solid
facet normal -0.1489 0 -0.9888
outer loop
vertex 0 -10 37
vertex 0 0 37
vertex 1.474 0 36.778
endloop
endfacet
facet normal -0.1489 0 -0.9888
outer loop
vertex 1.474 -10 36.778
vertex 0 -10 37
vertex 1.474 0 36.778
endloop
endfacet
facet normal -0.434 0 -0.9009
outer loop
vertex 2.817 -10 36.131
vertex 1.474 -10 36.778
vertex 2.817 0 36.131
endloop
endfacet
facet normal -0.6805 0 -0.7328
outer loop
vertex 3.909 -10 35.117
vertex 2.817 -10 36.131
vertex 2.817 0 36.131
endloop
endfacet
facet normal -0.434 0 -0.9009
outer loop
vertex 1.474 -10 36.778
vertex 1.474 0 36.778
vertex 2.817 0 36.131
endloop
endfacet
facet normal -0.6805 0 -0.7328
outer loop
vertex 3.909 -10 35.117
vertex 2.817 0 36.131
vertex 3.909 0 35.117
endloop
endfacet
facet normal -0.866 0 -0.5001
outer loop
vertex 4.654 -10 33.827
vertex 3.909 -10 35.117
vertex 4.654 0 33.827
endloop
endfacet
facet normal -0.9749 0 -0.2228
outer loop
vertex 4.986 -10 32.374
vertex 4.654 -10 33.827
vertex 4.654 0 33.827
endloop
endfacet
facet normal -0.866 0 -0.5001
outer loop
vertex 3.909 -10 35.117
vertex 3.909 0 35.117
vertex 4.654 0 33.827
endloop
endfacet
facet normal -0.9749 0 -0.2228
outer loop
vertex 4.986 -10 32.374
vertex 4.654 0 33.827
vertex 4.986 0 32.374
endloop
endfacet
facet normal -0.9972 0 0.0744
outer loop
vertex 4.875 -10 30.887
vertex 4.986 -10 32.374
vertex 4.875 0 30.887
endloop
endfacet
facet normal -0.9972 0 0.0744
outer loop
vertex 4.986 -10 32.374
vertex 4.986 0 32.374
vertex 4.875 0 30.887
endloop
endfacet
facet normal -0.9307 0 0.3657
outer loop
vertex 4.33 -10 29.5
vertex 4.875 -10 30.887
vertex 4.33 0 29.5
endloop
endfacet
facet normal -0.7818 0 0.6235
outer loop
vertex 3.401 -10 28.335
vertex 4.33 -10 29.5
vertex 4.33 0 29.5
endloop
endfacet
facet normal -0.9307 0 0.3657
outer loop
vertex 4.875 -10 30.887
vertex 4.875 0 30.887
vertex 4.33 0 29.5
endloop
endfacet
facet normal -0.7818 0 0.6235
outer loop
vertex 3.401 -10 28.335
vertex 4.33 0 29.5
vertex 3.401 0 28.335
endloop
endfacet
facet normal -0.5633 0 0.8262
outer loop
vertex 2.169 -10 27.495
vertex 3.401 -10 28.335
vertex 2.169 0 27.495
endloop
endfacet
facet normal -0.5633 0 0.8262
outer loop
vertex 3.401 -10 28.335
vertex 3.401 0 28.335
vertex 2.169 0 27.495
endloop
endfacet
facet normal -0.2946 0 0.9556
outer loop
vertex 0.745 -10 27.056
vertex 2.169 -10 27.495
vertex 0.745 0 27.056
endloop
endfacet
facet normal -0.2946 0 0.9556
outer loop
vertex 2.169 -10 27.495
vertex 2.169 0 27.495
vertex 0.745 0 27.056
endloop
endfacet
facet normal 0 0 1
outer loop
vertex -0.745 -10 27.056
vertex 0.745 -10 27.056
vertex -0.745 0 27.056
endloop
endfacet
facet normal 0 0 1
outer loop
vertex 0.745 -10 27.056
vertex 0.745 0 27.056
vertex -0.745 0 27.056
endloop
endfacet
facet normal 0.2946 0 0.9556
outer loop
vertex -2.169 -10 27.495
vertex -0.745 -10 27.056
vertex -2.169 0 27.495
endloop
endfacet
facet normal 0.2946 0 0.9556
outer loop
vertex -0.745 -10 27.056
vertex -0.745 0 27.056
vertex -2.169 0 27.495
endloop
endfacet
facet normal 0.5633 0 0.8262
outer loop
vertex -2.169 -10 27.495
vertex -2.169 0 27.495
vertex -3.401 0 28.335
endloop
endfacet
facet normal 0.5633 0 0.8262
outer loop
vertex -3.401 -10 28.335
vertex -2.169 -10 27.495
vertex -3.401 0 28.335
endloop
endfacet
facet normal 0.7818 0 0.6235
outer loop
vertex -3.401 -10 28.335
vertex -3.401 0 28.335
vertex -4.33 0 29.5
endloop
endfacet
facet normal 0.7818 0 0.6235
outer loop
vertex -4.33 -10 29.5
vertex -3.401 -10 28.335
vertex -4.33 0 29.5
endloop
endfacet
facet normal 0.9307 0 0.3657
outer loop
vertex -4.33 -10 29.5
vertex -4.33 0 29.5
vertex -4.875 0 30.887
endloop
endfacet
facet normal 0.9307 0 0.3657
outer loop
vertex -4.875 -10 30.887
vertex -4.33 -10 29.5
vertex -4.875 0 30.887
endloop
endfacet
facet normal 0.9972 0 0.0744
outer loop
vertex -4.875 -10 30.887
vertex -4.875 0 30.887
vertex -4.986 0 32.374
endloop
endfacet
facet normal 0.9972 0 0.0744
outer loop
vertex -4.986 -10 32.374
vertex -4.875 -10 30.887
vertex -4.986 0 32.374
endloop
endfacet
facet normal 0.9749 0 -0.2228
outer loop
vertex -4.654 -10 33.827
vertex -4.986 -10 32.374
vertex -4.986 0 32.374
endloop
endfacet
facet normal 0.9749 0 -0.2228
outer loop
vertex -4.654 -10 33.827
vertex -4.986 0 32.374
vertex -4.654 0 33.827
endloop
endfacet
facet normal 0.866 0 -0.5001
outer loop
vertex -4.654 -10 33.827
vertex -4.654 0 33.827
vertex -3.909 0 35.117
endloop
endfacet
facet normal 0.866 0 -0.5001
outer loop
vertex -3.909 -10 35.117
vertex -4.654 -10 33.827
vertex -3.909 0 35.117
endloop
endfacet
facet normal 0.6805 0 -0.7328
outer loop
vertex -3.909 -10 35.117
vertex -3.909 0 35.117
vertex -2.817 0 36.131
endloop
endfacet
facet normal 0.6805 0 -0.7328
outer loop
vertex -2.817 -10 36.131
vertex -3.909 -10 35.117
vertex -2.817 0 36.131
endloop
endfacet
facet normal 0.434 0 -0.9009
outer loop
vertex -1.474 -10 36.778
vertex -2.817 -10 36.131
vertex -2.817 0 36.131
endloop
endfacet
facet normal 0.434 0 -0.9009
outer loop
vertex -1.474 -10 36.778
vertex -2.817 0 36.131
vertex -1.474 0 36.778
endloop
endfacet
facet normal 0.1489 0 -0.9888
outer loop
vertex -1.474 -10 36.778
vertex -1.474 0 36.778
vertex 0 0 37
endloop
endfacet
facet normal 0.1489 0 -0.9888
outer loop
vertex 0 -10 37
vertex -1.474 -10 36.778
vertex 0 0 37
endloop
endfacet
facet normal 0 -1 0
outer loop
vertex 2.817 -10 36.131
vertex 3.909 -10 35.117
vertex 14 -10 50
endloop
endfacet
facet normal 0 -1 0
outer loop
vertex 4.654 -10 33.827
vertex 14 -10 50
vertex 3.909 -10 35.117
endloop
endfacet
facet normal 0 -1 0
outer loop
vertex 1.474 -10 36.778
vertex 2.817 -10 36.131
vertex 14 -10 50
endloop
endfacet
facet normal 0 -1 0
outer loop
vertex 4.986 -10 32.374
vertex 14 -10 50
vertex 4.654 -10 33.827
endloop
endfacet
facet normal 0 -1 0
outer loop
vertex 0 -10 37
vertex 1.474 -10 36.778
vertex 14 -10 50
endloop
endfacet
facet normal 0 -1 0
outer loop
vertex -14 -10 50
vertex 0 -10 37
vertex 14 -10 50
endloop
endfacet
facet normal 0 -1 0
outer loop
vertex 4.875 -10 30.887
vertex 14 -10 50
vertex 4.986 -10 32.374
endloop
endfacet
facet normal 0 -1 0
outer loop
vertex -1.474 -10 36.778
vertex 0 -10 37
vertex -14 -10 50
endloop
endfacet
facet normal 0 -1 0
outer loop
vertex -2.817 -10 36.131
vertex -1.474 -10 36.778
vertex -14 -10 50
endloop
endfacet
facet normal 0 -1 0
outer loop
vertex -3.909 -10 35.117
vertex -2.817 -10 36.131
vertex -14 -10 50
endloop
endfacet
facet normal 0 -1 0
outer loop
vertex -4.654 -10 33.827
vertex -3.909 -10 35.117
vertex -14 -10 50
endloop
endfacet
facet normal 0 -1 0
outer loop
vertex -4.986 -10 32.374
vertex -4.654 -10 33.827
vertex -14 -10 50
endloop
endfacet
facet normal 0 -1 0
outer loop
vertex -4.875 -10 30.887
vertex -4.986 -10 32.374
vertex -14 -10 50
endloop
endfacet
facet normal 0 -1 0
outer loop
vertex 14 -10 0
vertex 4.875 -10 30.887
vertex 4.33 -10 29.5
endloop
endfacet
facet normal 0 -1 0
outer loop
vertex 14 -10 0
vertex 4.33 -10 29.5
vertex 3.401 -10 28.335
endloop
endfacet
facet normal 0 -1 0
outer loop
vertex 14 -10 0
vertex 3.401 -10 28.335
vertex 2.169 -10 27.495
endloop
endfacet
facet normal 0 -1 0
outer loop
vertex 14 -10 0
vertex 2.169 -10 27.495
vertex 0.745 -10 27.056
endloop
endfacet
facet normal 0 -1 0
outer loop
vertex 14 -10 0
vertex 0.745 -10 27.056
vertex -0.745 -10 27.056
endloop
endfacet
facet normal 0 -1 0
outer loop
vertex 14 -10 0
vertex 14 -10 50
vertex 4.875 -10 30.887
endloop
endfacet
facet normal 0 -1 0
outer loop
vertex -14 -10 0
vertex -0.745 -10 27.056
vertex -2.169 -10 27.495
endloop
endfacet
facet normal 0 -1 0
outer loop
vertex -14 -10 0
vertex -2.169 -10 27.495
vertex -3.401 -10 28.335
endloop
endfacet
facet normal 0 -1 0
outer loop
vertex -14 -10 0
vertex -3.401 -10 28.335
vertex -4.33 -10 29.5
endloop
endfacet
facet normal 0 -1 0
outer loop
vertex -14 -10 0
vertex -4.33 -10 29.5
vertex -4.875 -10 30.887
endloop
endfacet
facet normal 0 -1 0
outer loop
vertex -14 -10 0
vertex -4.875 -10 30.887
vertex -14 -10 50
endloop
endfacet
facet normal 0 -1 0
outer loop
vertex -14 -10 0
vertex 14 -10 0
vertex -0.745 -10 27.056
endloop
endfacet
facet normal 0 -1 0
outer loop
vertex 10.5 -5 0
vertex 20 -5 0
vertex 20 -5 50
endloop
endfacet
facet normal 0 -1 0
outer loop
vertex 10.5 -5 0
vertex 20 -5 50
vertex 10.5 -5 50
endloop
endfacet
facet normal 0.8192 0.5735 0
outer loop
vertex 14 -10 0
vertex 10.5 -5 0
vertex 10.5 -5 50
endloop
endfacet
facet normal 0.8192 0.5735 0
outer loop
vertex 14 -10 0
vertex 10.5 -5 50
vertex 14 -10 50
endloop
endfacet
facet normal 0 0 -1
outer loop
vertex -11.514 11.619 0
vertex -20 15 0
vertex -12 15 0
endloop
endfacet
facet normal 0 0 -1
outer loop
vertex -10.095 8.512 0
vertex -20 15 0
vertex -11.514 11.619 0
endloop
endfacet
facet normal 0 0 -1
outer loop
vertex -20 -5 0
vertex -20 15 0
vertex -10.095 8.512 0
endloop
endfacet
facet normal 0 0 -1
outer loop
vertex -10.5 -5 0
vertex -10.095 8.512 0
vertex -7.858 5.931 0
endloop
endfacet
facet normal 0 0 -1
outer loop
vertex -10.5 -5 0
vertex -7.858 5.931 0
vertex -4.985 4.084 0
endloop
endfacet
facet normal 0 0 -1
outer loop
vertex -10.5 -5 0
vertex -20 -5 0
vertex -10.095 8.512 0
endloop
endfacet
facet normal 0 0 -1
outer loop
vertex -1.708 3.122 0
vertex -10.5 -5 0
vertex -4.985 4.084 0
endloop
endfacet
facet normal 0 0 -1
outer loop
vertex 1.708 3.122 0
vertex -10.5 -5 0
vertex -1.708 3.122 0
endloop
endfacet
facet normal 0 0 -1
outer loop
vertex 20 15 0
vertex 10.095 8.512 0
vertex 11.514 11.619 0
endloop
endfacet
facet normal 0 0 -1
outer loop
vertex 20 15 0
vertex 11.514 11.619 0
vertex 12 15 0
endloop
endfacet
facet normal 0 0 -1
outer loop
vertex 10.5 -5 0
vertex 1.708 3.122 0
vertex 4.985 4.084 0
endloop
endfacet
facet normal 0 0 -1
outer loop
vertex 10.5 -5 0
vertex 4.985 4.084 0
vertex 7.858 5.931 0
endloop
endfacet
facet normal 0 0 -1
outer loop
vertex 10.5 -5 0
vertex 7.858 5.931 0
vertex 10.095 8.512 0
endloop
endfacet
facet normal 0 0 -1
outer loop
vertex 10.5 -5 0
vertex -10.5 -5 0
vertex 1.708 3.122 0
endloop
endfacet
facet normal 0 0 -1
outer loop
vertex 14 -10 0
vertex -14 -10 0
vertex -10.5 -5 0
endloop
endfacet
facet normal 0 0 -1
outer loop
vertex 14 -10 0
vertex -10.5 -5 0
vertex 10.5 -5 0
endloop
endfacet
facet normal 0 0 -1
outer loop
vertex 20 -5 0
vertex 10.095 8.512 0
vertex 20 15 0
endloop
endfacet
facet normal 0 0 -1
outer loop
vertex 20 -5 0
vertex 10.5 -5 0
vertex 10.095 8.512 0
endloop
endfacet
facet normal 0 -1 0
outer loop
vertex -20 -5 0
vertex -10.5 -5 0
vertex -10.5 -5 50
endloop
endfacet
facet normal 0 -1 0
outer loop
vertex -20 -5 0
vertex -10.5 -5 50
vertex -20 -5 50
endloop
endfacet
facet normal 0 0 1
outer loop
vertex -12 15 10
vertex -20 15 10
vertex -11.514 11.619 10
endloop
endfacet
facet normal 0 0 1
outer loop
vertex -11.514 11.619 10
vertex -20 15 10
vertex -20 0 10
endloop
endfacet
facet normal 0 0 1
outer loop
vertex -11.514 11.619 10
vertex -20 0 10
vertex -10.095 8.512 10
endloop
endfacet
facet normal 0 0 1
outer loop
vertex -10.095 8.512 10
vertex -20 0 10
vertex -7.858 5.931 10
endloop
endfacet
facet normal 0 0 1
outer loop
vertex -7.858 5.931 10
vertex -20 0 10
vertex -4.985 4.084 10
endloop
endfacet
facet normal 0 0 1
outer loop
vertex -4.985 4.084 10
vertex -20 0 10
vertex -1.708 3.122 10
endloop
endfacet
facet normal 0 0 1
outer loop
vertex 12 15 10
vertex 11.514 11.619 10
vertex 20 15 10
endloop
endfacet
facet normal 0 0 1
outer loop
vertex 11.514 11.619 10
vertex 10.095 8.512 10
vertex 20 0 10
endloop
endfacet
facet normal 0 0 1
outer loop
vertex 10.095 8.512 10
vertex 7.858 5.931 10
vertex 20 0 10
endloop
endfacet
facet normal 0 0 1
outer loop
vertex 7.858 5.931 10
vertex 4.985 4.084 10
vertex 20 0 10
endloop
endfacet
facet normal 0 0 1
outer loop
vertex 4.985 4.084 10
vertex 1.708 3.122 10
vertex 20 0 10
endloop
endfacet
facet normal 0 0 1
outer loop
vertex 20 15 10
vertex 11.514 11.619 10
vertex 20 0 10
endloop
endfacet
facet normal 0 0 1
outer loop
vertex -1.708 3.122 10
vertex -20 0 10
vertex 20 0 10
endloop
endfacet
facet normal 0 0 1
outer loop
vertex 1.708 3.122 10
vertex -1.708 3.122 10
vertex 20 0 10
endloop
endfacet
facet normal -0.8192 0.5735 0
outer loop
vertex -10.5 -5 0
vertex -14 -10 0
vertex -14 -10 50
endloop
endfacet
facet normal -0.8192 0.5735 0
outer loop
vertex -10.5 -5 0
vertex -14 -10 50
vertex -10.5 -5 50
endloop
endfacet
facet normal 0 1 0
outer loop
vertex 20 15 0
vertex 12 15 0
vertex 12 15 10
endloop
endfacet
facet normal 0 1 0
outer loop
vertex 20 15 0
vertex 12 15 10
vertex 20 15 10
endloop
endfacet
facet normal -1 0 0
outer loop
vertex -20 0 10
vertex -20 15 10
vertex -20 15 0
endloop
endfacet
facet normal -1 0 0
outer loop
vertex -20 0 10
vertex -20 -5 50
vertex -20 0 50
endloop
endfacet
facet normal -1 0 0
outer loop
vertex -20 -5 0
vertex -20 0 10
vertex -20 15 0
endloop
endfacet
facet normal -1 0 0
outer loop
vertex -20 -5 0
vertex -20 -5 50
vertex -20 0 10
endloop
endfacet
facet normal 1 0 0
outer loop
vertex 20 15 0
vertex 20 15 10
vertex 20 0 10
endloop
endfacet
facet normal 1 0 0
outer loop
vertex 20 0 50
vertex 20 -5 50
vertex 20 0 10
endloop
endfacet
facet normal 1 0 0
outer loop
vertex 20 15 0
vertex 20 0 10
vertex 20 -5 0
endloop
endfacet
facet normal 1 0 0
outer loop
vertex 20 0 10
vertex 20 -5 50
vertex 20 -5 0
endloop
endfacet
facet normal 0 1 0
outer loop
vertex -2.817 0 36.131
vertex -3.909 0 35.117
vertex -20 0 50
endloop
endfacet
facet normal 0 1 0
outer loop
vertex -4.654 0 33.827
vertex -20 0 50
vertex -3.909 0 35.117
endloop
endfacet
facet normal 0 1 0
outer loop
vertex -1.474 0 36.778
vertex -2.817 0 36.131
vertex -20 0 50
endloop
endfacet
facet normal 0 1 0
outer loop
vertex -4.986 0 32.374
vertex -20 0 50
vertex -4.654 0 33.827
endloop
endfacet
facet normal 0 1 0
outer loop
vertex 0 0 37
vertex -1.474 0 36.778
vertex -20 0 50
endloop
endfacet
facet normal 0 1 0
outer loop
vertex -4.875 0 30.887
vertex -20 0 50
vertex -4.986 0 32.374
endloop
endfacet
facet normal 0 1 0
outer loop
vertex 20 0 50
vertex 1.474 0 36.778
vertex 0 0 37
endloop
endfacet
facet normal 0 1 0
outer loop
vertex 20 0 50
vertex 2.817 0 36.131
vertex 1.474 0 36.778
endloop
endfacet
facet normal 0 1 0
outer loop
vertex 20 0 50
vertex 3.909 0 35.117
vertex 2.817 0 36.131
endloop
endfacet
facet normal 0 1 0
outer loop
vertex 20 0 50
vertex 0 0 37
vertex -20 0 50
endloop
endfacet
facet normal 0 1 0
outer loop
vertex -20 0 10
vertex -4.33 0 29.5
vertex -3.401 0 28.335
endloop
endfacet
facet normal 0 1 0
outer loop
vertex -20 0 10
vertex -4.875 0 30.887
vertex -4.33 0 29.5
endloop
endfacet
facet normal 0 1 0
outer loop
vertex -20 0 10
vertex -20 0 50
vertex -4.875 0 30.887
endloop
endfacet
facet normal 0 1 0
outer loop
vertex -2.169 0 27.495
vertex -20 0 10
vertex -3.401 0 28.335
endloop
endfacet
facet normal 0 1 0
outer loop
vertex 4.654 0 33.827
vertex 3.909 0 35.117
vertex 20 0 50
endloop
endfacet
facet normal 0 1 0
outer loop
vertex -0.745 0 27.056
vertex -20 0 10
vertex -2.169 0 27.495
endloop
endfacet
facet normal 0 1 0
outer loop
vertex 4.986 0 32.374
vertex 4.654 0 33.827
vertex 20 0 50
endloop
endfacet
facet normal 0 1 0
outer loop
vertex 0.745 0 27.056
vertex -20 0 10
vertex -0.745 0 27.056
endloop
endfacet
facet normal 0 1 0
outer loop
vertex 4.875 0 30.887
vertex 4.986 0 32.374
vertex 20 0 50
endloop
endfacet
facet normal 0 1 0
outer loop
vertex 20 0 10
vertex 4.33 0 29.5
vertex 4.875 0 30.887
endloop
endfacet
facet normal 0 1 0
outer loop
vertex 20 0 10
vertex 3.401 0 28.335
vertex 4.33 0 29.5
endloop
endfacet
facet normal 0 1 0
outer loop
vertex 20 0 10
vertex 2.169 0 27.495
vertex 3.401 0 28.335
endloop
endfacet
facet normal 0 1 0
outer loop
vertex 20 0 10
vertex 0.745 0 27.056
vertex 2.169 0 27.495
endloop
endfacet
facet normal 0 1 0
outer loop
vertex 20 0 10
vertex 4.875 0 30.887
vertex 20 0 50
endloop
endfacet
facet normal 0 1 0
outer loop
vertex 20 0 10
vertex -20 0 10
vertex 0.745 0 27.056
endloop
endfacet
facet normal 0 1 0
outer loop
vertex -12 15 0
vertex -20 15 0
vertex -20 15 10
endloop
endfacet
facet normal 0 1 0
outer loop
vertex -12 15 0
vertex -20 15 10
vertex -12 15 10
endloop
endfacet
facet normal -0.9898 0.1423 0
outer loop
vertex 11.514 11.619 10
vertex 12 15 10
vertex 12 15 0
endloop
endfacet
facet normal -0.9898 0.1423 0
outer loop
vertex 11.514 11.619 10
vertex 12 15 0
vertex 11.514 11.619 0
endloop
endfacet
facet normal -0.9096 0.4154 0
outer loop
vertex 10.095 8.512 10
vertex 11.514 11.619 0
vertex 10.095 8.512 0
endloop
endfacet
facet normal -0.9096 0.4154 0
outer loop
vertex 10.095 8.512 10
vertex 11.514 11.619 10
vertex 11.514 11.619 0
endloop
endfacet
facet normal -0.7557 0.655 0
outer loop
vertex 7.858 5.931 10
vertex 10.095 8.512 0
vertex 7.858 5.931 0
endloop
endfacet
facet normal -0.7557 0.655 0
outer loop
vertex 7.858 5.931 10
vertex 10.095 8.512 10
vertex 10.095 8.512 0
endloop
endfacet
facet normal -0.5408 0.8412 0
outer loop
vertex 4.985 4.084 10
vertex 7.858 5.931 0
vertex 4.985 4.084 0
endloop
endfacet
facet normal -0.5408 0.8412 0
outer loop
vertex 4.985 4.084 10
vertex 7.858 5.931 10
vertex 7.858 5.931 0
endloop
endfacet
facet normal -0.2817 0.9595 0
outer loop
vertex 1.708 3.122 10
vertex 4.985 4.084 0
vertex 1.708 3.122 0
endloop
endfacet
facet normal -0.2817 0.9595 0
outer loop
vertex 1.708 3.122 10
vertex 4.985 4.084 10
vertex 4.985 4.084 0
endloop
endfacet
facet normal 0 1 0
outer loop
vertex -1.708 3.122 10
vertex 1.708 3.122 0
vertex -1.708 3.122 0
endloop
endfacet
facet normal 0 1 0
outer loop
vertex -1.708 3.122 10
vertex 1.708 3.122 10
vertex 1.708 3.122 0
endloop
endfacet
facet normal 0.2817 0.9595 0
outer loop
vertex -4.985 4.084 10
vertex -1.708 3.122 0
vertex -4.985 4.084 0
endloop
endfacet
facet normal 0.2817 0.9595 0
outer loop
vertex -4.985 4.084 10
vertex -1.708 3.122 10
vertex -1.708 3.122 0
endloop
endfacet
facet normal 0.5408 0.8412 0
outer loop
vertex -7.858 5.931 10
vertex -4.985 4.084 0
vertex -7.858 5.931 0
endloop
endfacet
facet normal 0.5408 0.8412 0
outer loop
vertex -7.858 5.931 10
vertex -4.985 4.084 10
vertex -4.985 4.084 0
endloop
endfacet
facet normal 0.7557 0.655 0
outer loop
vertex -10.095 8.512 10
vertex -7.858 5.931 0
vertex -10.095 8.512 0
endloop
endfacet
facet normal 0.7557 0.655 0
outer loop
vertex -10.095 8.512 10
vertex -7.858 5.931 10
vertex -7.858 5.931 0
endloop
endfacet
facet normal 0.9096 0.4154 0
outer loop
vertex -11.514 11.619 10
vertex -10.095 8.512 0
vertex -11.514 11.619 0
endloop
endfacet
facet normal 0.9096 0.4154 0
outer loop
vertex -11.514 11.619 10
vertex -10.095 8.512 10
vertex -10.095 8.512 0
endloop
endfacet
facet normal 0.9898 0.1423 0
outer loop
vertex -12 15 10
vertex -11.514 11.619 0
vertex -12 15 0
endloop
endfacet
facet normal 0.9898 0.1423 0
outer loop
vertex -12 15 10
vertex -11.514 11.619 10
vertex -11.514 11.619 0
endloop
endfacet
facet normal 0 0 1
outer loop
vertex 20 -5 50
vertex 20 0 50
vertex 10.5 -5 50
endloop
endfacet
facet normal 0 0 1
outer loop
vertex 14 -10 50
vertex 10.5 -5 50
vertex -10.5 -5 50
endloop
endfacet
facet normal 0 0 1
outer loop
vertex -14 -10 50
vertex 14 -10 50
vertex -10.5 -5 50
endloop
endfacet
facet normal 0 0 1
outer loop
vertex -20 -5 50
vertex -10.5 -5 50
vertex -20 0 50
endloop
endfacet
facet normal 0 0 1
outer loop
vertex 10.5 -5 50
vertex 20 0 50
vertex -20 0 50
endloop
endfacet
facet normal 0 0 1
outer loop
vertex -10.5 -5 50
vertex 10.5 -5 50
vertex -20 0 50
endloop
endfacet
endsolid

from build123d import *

# Parameters (mm, degrees)
EXTRUDE_1_DEPTH     = 50
SKETCH_2_R          = 5
CUT_EXTRUDE_1_DEPTH = 55.772255751
SKETCH_3_W          = 40
SKETCH_3_H          = 10
EXTRUDE_3_DEPTH     = 15
CUT_EXTRUDE_2_DEPTH = 48.16990566


with BuildPart() as part:
    # 草图1 → 凸台-拉伸1 (new body)
    with BuildSketch(Plane.XY):
        Polygon((-20, 0), (20, 0), (20, -5), (10.5, -5), (14, -10), (-14, -10), (-10.5, -5), (-20, -5), align=None)
    extrude(amount=EXTRUDE_1_DEPTH)

    # 草图2 → 切除-拉伸1 (cut, through all)
    with BuildSketch(Plane(origin=(0, 0, 0), x_dir=(1, 0, 0), z_dir=(0, 1, 0))):
        with Locations(Location((0, -32, 0), (0, 0, 270))):
            Circle(SKETCH_2_R)
    extrude(amount=-CUT_EXTRUDE_1_DEPTH, mode=Mode.SUBTRACT)

    # 草图3 → 凸台-拉伸3 (add)
    with BuildSketch(Plane(origin=(0, 0, 0), x_dir=(1, 0, 0), z_dir=(0, 1, 0))):
        with Locations((0, -5)):
            Rectangle(SKETCH_3_W, SKETCH_3_H)
    extrude(amount=EXTRUDE_3_DEPTH)

    # 草图4 → 切除-拉伸2 (cut, through all)
    with BuildSketch(Plane.XY.offset(10)):
        with BuildLine():
            Line((-12, 15), (12, 15))
            ThreePointArc((12, 15), (0, 3), (-12, 15))
        make_face()
    extrude(amount=-CUT_EXTRUDE_2_DEPTH, mode=Mode.SUBTRACT)


solid = part.part
